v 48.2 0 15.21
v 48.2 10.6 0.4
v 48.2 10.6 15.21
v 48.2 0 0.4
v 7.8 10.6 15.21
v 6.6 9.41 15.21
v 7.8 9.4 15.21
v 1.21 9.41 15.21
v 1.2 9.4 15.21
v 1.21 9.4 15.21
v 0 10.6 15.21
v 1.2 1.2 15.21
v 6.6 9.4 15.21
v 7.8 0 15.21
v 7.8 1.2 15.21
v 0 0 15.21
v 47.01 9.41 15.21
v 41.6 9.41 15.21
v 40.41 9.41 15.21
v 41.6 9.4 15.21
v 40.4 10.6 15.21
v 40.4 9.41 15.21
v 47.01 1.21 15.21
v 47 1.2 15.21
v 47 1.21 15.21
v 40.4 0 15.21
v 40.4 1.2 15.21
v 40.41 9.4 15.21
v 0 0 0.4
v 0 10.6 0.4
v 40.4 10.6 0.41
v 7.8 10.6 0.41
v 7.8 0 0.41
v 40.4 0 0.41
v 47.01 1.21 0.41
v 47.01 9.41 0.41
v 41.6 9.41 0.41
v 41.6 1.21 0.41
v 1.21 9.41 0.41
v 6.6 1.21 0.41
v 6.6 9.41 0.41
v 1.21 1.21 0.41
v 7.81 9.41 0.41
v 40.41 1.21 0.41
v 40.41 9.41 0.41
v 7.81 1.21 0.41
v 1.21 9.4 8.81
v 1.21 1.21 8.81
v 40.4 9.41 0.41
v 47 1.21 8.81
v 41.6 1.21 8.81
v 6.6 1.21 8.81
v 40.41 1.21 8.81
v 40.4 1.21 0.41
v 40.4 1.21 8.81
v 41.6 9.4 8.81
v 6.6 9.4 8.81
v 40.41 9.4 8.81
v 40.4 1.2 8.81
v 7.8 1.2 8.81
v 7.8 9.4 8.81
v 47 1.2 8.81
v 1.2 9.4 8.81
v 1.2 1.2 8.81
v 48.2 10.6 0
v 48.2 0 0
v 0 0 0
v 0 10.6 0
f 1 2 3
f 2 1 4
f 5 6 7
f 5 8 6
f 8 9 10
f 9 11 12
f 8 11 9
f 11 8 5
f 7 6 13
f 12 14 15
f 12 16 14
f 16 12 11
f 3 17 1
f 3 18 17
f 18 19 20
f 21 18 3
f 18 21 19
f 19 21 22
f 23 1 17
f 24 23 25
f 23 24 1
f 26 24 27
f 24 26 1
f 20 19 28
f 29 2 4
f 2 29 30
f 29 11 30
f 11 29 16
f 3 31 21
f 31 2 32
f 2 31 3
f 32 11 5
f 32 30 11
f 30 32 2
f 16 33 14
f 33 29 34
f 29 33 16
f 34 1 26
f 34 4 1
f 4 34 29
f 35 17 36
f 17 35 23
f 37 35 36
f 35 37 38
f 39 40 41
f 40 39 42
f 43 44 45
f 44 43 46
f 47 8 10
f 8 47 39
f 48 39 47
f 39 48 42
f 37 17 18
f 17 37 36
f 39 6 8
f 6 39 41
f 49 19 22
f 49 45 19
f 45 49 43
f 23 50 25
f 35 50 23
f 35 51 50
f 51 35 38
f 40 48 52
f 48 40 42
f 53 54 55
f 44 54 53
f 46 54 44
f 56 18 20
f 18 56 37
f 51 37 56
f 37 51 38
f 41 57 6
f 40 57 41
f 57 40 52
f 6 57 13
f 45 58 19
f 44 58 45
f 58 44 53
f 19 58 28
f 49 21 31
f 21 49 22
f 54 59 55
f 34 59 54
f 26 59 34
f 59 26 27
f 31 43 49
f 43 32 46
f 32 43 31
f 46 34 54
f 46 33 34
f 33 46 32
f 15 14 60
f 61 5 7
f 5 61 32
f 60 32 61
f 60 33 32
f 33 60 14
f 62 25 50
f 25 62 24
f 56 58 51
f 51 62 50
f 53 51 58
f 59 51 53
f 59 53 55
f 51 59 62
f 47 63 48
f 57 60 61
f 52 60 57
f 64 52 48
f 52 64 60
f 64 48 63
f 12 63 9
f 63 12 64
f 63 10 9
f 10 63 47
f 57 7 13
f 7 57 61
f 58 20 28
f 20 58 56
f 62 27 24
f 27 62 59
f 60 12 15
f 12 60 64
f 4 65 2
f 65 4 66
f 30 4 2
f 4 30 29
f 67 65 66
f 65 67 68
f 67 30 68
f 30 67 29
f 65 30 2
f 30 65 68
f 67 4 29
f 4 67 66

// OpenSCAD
// file: ../../Base/Rotation.scad
// Fischertechnik Box Foundation
// Geometry Helpers Rotation

include <PlacementOptions.scad>

// getRotatedSpace(space, rotation=NoRotation)
// Rotates the space dependent on the specified rotation

function getRotatedSpace(space, rotation=NoRotation) = [
    (rotation == Rotate90 || rotation == Rotate270) ? space.y : space.x,
    (rotation == Rotate90 || rotation == Rotate270) ? space.x : space.y
];

// Rotates the given space around the fixed left lower corner
// space = the space the children needs as width/depth list [width,depth]
// rotation = 0 Rotate0 degrees, 1 Rotate90 degrees, 2 Rotate180 degrees, 3 Rotate270 degrees (equivalent to -90)

module RotateFix(space, rotation=NoRotation) {
    dy = (rotation == Rotate0 || rotation == Rotate270) ? 0 :
        (rotation == Rotate90) ? space.x :
        space.y;
    dx = (rotation < Rotate180) ? 0 :
        (rotation == Rotate180) ? space.x :
        space.y;
    
    translate([dx, dy, 0])
        rotate([0, 0, rotations[rotation]])
            children();
}
// file: ../../Base/Alignment.scad
// Fischertechnik Box Foundation
// Geometry Helpers Alignment

include <PlacementOptions.scad>

// getAlignedX(elementWidth, spaceWidth, align=AlignRight, offset=0)
// Gets the aligned X offset of an element with the given
// width in the given space.
// elementWidth = The width of the element to positon
// spaceWidth = The space where the element should be aligned
// align = 0 AlignLeft, 1 AlignCenter, 2 AlignRight
// offset = an optional offset from the aligned position. When
// aligned left or centered, then positive values are in X direction.
// When aligned right then positive values are in negative X direction.

function getAlignedX(elementWidth, spaceWidth, align=AlignRight, offset=0) =
    (align == AlignLeft) ?
        offset :
        ((align == AlignCenter) ?
        (spaceWidth - elementWidth)/2 + offset :
        spaceWidth - offset - elementWidth);

// getAlignedY(elementDepth, spaceDepth, align=AlignTop, offset=0)
// Gets the aligned Y offset of an element with the given
// depth in the given space.
// elementDepth = The depth of the element to positon
// spaceDepth = The space where the element should be aligned
// align = 0 AlignBottom, 1 AlignCenter, 2 AlignTop
// offset = an optional offset from the aligned position. When
// aligned bottom or centered, then positive values are in Y direction.
// When aligned top then positive values are in negative Y direction.

function getAlignedY(elementDepth, spaceDepth, align=AlignTop, offset=0) =
    (align == AlignBottom) ?
        offset :
        ((align == AlignCenter) ?
        (spaceDepth - elementDepth)/2 + offset :
        spaceDepth - offset - elementDepth);
// file: ../../Base/Boxes.scad
// Fischertechnik Box Foundation
// Pre-designed Boxes

use <Constants.scad>

include <PlacementOptions.scad>

box190Width = 190;
box190Depth = 130;
box130Width = 130;
box130Depth = 95;

// Values are from an original ec3 box
topBottomDifference = 1.5;
outerHeight = 40;
innerHeight = 38.2;
baseThickness = outerHeight - innerHeight;
stackExcess = 5.7;
radius = 3.5;
wallThickness = 1.5;
tolerance = 0.2;
stackOffset = innerHeight - stackExcess;

boxUsageHeight = stackOffset;
boxWallThickness = wallThickness;
boxBaseThickness = baseThickness;
boxWebWidth = 3.0;

// getBoxWallThickness()
// Gets the wall thickness of a Fischertechnik Box
function getBoxWallThickness() = boxWallThickness;

// getBoxUsageHeight()
// Gets the usable height of a Fischertechnik box
function getBoxUsageHeight() = boxUsageHeight;

// getBoxInnerHeight()
// Gets the inner height of a Fischertechnik box, including the stack excess
function getBoxInnerHeight() = innerHeight;

// getBoxBaseThickness()
// Gets the thickness of the Fischertechnik box base.
function getBoxBaseThickness() = boxBaseThickness;

// getBoxWebWidth()
// Gets the width of a box web
function getBoxWebWidth() = boxWebWidth;

// getBox190Space()
// Gets the usable inner space of a Box 190 as an x/y-list
function getBox190Space() = [
    box190Width - 2*getBoxWallThickness() - topBottomDifference, 
    box190Depth - 2*getBoxWallThickness() - topBottomDifference ];

// BoxBase(width, depth)
// Creates an empty stackable Fischertechnik compatible box
// width = Outer width of the box (190, 130, ...)
// depth = Outer depth of the box (130, 95, ...)

module BoxBase(width, depth, height=outerHeight) {    
    thinPlate = 0.01;

    innerHeight = height - baseThickness;    
    
    module BodyPlate(width, depth) {
        translate([radius, radius])
        hull() {
            w = width-2*radius;
            d = depth-2*radius;
            cube([w, d, thinPlate]);
            cylinder(thinPlate, r=radius, $fn=getFragments());
            translate([w, 0])
                cylinder(thinPlate, r=radius, $fn=getFragments());
            translate([w, d])
                cylinder(thinPlate, r=radius, $fn=getFragments());
            translate([0, d])
                cylinder(thinPlate, r=radius, $fn=getFragments());
        }
    }
    
    module Body(tolerance=tolerance) {
        hull() {
            // Bottom with tolerance to fit into the original boxes when stacked
            translate([-wallThickness+tolerance, -wallThickness+tolerance, -baseThickness])
                BodyPlate(width-topBottomDifference-2*tolerance, depth-topBottomDifference-2*tolerance);
            
            // Top
            translate([-wallThickness-topBottomDifference/2, -wallThickness-topBottomDifference/2, innerHeight-thinPlate])
                BodyPlate(width, depth);
         }
    }

    module Cutoff() {
        hull() {
            coWidth = width - 2*wallThickness;
            coDepth = depth - 2*wallThickness;
            
            // Bottom
            BodyPlate(coWidth-topBottomDifference, coDepth-topBottomDifference);

            // Top
            translate([-topBottomDifference/2, -topBottomDifference/2, innerHeight+thinPlate]) 
                BodyPlate(coWidth, coDepth);
        }
    }
    
    difference() {        
        Body();
        Cutoff();
        stackOffset = innerHeight - stackExcess;
        translate([0, 0, stackOffset + baseThickness])
            Body(tolerance=0);
    }
}

// Creates the Fischertechnik empty box 130x190 mm and places it at position 0,0
// 190x130 are the outer sizes, the inner space is slightly smaller. Use getBox190Space() to get the inner sizes.
// The box is positioned that the usable inner space is at the 0,0,0 position. The

module Box190() {
    BoxBase(box190Width, box190Depth);
}

// Gets the usable inner space of a Box 130 as an x/y-list
function getBox130Space() = [
    box130Width - 2*getBoxWallThickness() - topBottomDifference, 
    box130Depth - 2*getBoxWallThickness() - topBottomDifference ];

// Creates the Fischertechnik empty box 95x130 mm and places it at position 0,0
// 190x130 are the outer sizes, the inner space is slightly smaller. Use getBox190Space() to get the inner sizes.
// The box is positioned that the usable inner space is at the 0,0,0 position. The

module Box130() {
    BoxBase(box130Width, box130Depth);
}

// Creates a web at the specified box walls
// corner 0 = LowerLeft, 1 = UpperLeft, 2 = UpperRight, 3 = LowerRight
// side 0 = LeftOfCorner, 1 = RightOfCorner
// distance = Distance in mm from the corner
// boxSpace = inner width and depth of the box (default: Box 190)
// webWidth = length of the web (default is 3 mms)
// webThickness = thickness of the web (default is 1 mm)

module BoxWeb(corner, side, distance, boxSpace=getBox190Space(), webWidth=getBoxWebWidth(), webThickness=1.0) {
    sink = getBoxWallThickness()/2;

    width = (corner % 2 == 0) ? 
            (side == LeftOfCorner ? webWidth : webThickness) :
            (side == LeftOfCorner ? webThickness : webWidth);

    depth = (corner % 2 == 0) ? 
            (side == RightOfCorner ? webWidth : webThickness) :
            (side == RightOfCorner ? webThickness : webWidth);
    
    xDiff = corner == LowerLeft ? 
                (side == LeftOfCorner ? -sink : distance) :
            (corner == UpperLeft ?                
                (side == LeftOfCorner ? distance : -sink) :
            (corner == UpperRight ?
                (side == LeftOfCorner ? boxSpace.x-webWidth+sink : boxSpace.x-distance-webThickness) :
                (side == LeftOfCorner ? boxSpace.x-distance-webThickness: boxSpace.x-webWidth+sink)));

    yDiff = corner == LowerLeft ? 
                (side == RightOfCorner ? -sink : distance) :
            (corner == UpperLeft ?
                (side == RightOfCorner ? boxSpace.y-distance : boxSpace.y-webWidth+sink) :
            (corner == UpperRight ?
                (side == RightOfCorner ? boxSpace.y-webWidth+sink : boxSpace.y-distance) :
                (side == RightOfCorner ? distance : -sink)));
    
    translate([xDiff, yDiff, -getExcess()])
        cube([width, depth, boxUsageHeight + 2*getExcess()]);
}
// file: ../../Base/PlacementOptions.scad
// Fischertechnik Box Foundation
// Placement Options

// Alignment
NoAlign = 0;
AlignLeft = 1;
AlignBottom = 2;
AlignCenter = 3;
AlignRight = 4;
AlignTop = 5;

// Element rotation degree steps
rotations = [0, -90, -180, -270];

// Rotation
NoRotation = 0;
Rotate0 = 0;
Rotate90 = 1;
Rotate180 = 2;
Rotate270 = 3;

// Docking (seen from above)
NoDock = -1;
DockLeft = 0;
DockTop = 1;
DockRight = 2;
DockCorner = 2;
DockBottom = 3;

// Web corners
LowerLeft = 0;
UpperLeft = 1;
UpperRight = 2;
LowerRight = 3;

// Web position relative to corner
LeftOfCorner = 0;
RightOfCorner = 1;
// file: ../../Base/Placement.scad
// Fischertechnik Box Foundation
// Geometry Helpers Placement

use <Constants.scad>
use <Alignment.scad>
use <Rotation.scad>
use <Boxes.scad>

include <PlacementOptions.scad>

// Place(x=0, y=0, elementSpace=[0,0], alignX=AlignLeft, alignY=AlignBottom, rotation=Rotate0, boxSpace=getBox190Space())
// Places the child at the specified position
// y = Y-Position. This is a relative position when an X aligment is specified.
// x = X-Position. This is a relative position when an Y aligment is specified.
// elementSpace = space of the element to be placed [x,y]
// alignX = -1=NoAlign, 0 AlignLeft, 1 AlignCenter, 3 AlignRight (elementSpace and boxSpace required!)
// alignY = -1=NoAlign, 2 AlignBottom, 1 AlignCenter, 4 AlignTop (elementSpace and boxSpace required!)
// rotation = 0 Rotate0 0 degrees, 1 Rotate90 90 degrees, 
// 2 Rotate180 180 degrees, 3 Rotate270 270 degrees (equivalent to -90)
// boxSpace = Inner space of the box where the placement occurs [x,y] - default is Box 190x130 inner space

module Place(x=0, y=0, elementSpace=[0,0], 
  alignX=AlignLeft, alignY=AlignBottom, 
  rotation=NoRotation, boxSpace=getBox190Space()) {

    module Position(x, y, space, rotation=Rotate0) {
        translate([x, y, 0])
            RotateFix(space, rotation)
                children();
    }

    space = getRotatedSpace(elementSpace, rotation);
    alignedX = getAlignedX(space.x, boxSpace.x, alignX, x);
    alignedY = getAlignedY(space.y, boxSpace.y, alignY, y);
    Position(alignedX, alignedY, elementSpace, rotation)
        children();
}

// Center(space=getBox130Space(), elementSpace=[0,0])
// space = Space where the children is centered. For cylinder use centered=true and no elementSpace.
// elementSpace = space of the element to be centered [x,y]

module Center(space=getBox190Space(), elementSpace=[0,0]) {
    Place(elementSpace=elementSpace, boxSpace=space, alignX=AlignCenter, alignY=AlignCenter)
        children();
}

// CenterHorizontal(width=0, y=0, offset=0, space=getBox130Space())
// width = Width of the element to be placed.
// y = Y position of the element
// offset = Offset from the center position (negative will be left of the center)
// space = Space where the element is placed

module CenterHorizontal(width=0, y=0, offset=0, space=getBox190Space()) {
    Place(x=offset, y=y, elementSpace=[width, 0], boxSpace=space, alignX=AlignCenter)
        children(0);
}

// CenterVertical(depth=0, x=0, offset=0, space=getBox130Space())
// depth = Depth of the element to be placed.
// x = X position of the element
// offset = Offset from the center position (negative will be down of the center)
// space = Space where the element is placed

module CenterVertical(depth=0, x=0, offset=0, space=getBox190Space()) {
    Place(x=x, y=offset, elementSpace=[0, depth], boxSpace=space, alignY=AlignCenter)
        children(0);
}

// getIsVertical(align)
// True if the specified alignment needs a vertical orientation for a divider (AlignRight, AlignLeft)

function getIsVertical(align) = (align == AlignRight || align == AlignLeft);

// getIsHorizontal(align)
// True if the specified alignment needs a horizontal orientation for a divider (AlignTop, AlignBottom)

function getIsHorizontal(align) = (align == AlignTop || align == AlignBottom);
// file: ../../Elements/AxisClip10.scad
// Fischertechnik Box Library
// Axis for clip 10
// 31023

use <../ModelBase/Simple.scad>
use <../Base/Constants.scad>

width = 12;
depth = 12;
height = 23;
upperDiameter = 3.6;
clipHeight = 10;

// getAxisClip10Space()
// Gets the space of a frame for a clip 10 with spring ring (mot2)

function getAxisClip10Space() = [width, depth, height];

// AxisClip10(height, clipHeight)
// Axis for clip 10 with spring ring (mot2)
// height = Height of the complete axis
// clipHeight = Height of the rt for the clip (standard is 10, in mot3 its only 7)

module AxisClip10(height=height, clipHeight=clipHeight) {
    LeveledAxisWithSpace(height, height-clipHeight, getAxisClip10Space(), diameter=upperDiameter);
}

// Tests
color("lightgray")
AxisClip10();
// file: ../../Base/Constants.scad
// Fischertechnik Box Foundation
// Constants

// Constant values necessary for multiple elements

// Base constants
dividerThickness = 1.2;
excess = 0.01;
fragments = 90;
tolerance = 0.8;

// Gets the thickness of a divider 
function getDividerThickness() = dividerThickness;

// Gets the excess that is used to merge walls into each other
function getExcess() = excess;

// Gets amount of fragments of a cylinder
function getFragments() = fragments;

// Gets the inner tolerance of a frame to each side
function getTolerance() = tolerance;


// Fischertechnik specific constants
axisDiameter = 4;
axisBottomDiameter = axisDiameter + 1;
standardEdgeDistance = 2.5;
standardWebDistance = 11.5;
standardCornerLength = 15;
tubeWallFactor = 0.8;
smallPartsFrameHeight = 20;

// Gets axis diameter
function getAxisDiameter() = axisDiameter;

// Gets axis bottom diameter for thicker part at the bottom
function getAxisBottomDiameter() = axisBottomDiameter;

// gets the standard distance to the wall of the box for dockable frames with webs
function getStandardEdgeDistance() = standardEdgeDistance;

// gets the standard distance of each web to the corner of the dockable frame
function getStandardWebDistance() = standardWebDistance;

// gets the standard length of the corner walls of a dockable frame
function getStandardCornerLength() = standardCornerLength;

// gets the wall thickness of a tube.
function getTubeWallThickness() = tubeWallFactor * getDividerThickness();

// gets the frame height for docked small parts boxes.
function getSmallPartsFrameHeight() = smallPartsFrameHeight;
// file: ../../Elements/FrameTwoConnectors45.scad
// Fischertechnik Box Library
// Frame for two Connectors 45
// 31330

use <../ModelBase/Complex.scad>

width = 45;
depth = 8.2;
height = 14.8;

// getFrameTwoConnectors45Space()
// Gets the space needed for the frame for two connectors 45.
function getFrameTwoConnectors45Space() = getElevatedFramesWithCutoffSpace([width, depth, height]);

// FrameTwoConnectors45()
// Frame for two connectors 45

module FrameTwoConnectors45() {    
    bearingLength = 6.6;
    loadHeight = 6.4;
    
    ElevatedFramesWithCutoff([width, depth, loadHeight], depth, height, bearingLength);
}

// Test
color("lightgray")
FrameTwoConnectors45();
// file: ../TestPrint.scad
// 3D Print Test Base

use <../Base/Constants.scad>

use <../Elements/AxisClip10.scad>

module TestPrint(elementSpace) {
    cube([elementSpace.x, elementSpace.y, 0.4]);
    translate([0,0,0.4+getExcess()]) {
        children();
    }
}

TestPrint(getAxisClip10Space())
    AxisClip10();
// main file
// 3D Print Test
// FrameTwoConnectors45

use <../TestPrint.scad>
use <../../Elements/FrameTwoConnectors45.scad>

TestPrint(getFrameTwoConnectors45Space())
    FrameTwoConnectors45();
